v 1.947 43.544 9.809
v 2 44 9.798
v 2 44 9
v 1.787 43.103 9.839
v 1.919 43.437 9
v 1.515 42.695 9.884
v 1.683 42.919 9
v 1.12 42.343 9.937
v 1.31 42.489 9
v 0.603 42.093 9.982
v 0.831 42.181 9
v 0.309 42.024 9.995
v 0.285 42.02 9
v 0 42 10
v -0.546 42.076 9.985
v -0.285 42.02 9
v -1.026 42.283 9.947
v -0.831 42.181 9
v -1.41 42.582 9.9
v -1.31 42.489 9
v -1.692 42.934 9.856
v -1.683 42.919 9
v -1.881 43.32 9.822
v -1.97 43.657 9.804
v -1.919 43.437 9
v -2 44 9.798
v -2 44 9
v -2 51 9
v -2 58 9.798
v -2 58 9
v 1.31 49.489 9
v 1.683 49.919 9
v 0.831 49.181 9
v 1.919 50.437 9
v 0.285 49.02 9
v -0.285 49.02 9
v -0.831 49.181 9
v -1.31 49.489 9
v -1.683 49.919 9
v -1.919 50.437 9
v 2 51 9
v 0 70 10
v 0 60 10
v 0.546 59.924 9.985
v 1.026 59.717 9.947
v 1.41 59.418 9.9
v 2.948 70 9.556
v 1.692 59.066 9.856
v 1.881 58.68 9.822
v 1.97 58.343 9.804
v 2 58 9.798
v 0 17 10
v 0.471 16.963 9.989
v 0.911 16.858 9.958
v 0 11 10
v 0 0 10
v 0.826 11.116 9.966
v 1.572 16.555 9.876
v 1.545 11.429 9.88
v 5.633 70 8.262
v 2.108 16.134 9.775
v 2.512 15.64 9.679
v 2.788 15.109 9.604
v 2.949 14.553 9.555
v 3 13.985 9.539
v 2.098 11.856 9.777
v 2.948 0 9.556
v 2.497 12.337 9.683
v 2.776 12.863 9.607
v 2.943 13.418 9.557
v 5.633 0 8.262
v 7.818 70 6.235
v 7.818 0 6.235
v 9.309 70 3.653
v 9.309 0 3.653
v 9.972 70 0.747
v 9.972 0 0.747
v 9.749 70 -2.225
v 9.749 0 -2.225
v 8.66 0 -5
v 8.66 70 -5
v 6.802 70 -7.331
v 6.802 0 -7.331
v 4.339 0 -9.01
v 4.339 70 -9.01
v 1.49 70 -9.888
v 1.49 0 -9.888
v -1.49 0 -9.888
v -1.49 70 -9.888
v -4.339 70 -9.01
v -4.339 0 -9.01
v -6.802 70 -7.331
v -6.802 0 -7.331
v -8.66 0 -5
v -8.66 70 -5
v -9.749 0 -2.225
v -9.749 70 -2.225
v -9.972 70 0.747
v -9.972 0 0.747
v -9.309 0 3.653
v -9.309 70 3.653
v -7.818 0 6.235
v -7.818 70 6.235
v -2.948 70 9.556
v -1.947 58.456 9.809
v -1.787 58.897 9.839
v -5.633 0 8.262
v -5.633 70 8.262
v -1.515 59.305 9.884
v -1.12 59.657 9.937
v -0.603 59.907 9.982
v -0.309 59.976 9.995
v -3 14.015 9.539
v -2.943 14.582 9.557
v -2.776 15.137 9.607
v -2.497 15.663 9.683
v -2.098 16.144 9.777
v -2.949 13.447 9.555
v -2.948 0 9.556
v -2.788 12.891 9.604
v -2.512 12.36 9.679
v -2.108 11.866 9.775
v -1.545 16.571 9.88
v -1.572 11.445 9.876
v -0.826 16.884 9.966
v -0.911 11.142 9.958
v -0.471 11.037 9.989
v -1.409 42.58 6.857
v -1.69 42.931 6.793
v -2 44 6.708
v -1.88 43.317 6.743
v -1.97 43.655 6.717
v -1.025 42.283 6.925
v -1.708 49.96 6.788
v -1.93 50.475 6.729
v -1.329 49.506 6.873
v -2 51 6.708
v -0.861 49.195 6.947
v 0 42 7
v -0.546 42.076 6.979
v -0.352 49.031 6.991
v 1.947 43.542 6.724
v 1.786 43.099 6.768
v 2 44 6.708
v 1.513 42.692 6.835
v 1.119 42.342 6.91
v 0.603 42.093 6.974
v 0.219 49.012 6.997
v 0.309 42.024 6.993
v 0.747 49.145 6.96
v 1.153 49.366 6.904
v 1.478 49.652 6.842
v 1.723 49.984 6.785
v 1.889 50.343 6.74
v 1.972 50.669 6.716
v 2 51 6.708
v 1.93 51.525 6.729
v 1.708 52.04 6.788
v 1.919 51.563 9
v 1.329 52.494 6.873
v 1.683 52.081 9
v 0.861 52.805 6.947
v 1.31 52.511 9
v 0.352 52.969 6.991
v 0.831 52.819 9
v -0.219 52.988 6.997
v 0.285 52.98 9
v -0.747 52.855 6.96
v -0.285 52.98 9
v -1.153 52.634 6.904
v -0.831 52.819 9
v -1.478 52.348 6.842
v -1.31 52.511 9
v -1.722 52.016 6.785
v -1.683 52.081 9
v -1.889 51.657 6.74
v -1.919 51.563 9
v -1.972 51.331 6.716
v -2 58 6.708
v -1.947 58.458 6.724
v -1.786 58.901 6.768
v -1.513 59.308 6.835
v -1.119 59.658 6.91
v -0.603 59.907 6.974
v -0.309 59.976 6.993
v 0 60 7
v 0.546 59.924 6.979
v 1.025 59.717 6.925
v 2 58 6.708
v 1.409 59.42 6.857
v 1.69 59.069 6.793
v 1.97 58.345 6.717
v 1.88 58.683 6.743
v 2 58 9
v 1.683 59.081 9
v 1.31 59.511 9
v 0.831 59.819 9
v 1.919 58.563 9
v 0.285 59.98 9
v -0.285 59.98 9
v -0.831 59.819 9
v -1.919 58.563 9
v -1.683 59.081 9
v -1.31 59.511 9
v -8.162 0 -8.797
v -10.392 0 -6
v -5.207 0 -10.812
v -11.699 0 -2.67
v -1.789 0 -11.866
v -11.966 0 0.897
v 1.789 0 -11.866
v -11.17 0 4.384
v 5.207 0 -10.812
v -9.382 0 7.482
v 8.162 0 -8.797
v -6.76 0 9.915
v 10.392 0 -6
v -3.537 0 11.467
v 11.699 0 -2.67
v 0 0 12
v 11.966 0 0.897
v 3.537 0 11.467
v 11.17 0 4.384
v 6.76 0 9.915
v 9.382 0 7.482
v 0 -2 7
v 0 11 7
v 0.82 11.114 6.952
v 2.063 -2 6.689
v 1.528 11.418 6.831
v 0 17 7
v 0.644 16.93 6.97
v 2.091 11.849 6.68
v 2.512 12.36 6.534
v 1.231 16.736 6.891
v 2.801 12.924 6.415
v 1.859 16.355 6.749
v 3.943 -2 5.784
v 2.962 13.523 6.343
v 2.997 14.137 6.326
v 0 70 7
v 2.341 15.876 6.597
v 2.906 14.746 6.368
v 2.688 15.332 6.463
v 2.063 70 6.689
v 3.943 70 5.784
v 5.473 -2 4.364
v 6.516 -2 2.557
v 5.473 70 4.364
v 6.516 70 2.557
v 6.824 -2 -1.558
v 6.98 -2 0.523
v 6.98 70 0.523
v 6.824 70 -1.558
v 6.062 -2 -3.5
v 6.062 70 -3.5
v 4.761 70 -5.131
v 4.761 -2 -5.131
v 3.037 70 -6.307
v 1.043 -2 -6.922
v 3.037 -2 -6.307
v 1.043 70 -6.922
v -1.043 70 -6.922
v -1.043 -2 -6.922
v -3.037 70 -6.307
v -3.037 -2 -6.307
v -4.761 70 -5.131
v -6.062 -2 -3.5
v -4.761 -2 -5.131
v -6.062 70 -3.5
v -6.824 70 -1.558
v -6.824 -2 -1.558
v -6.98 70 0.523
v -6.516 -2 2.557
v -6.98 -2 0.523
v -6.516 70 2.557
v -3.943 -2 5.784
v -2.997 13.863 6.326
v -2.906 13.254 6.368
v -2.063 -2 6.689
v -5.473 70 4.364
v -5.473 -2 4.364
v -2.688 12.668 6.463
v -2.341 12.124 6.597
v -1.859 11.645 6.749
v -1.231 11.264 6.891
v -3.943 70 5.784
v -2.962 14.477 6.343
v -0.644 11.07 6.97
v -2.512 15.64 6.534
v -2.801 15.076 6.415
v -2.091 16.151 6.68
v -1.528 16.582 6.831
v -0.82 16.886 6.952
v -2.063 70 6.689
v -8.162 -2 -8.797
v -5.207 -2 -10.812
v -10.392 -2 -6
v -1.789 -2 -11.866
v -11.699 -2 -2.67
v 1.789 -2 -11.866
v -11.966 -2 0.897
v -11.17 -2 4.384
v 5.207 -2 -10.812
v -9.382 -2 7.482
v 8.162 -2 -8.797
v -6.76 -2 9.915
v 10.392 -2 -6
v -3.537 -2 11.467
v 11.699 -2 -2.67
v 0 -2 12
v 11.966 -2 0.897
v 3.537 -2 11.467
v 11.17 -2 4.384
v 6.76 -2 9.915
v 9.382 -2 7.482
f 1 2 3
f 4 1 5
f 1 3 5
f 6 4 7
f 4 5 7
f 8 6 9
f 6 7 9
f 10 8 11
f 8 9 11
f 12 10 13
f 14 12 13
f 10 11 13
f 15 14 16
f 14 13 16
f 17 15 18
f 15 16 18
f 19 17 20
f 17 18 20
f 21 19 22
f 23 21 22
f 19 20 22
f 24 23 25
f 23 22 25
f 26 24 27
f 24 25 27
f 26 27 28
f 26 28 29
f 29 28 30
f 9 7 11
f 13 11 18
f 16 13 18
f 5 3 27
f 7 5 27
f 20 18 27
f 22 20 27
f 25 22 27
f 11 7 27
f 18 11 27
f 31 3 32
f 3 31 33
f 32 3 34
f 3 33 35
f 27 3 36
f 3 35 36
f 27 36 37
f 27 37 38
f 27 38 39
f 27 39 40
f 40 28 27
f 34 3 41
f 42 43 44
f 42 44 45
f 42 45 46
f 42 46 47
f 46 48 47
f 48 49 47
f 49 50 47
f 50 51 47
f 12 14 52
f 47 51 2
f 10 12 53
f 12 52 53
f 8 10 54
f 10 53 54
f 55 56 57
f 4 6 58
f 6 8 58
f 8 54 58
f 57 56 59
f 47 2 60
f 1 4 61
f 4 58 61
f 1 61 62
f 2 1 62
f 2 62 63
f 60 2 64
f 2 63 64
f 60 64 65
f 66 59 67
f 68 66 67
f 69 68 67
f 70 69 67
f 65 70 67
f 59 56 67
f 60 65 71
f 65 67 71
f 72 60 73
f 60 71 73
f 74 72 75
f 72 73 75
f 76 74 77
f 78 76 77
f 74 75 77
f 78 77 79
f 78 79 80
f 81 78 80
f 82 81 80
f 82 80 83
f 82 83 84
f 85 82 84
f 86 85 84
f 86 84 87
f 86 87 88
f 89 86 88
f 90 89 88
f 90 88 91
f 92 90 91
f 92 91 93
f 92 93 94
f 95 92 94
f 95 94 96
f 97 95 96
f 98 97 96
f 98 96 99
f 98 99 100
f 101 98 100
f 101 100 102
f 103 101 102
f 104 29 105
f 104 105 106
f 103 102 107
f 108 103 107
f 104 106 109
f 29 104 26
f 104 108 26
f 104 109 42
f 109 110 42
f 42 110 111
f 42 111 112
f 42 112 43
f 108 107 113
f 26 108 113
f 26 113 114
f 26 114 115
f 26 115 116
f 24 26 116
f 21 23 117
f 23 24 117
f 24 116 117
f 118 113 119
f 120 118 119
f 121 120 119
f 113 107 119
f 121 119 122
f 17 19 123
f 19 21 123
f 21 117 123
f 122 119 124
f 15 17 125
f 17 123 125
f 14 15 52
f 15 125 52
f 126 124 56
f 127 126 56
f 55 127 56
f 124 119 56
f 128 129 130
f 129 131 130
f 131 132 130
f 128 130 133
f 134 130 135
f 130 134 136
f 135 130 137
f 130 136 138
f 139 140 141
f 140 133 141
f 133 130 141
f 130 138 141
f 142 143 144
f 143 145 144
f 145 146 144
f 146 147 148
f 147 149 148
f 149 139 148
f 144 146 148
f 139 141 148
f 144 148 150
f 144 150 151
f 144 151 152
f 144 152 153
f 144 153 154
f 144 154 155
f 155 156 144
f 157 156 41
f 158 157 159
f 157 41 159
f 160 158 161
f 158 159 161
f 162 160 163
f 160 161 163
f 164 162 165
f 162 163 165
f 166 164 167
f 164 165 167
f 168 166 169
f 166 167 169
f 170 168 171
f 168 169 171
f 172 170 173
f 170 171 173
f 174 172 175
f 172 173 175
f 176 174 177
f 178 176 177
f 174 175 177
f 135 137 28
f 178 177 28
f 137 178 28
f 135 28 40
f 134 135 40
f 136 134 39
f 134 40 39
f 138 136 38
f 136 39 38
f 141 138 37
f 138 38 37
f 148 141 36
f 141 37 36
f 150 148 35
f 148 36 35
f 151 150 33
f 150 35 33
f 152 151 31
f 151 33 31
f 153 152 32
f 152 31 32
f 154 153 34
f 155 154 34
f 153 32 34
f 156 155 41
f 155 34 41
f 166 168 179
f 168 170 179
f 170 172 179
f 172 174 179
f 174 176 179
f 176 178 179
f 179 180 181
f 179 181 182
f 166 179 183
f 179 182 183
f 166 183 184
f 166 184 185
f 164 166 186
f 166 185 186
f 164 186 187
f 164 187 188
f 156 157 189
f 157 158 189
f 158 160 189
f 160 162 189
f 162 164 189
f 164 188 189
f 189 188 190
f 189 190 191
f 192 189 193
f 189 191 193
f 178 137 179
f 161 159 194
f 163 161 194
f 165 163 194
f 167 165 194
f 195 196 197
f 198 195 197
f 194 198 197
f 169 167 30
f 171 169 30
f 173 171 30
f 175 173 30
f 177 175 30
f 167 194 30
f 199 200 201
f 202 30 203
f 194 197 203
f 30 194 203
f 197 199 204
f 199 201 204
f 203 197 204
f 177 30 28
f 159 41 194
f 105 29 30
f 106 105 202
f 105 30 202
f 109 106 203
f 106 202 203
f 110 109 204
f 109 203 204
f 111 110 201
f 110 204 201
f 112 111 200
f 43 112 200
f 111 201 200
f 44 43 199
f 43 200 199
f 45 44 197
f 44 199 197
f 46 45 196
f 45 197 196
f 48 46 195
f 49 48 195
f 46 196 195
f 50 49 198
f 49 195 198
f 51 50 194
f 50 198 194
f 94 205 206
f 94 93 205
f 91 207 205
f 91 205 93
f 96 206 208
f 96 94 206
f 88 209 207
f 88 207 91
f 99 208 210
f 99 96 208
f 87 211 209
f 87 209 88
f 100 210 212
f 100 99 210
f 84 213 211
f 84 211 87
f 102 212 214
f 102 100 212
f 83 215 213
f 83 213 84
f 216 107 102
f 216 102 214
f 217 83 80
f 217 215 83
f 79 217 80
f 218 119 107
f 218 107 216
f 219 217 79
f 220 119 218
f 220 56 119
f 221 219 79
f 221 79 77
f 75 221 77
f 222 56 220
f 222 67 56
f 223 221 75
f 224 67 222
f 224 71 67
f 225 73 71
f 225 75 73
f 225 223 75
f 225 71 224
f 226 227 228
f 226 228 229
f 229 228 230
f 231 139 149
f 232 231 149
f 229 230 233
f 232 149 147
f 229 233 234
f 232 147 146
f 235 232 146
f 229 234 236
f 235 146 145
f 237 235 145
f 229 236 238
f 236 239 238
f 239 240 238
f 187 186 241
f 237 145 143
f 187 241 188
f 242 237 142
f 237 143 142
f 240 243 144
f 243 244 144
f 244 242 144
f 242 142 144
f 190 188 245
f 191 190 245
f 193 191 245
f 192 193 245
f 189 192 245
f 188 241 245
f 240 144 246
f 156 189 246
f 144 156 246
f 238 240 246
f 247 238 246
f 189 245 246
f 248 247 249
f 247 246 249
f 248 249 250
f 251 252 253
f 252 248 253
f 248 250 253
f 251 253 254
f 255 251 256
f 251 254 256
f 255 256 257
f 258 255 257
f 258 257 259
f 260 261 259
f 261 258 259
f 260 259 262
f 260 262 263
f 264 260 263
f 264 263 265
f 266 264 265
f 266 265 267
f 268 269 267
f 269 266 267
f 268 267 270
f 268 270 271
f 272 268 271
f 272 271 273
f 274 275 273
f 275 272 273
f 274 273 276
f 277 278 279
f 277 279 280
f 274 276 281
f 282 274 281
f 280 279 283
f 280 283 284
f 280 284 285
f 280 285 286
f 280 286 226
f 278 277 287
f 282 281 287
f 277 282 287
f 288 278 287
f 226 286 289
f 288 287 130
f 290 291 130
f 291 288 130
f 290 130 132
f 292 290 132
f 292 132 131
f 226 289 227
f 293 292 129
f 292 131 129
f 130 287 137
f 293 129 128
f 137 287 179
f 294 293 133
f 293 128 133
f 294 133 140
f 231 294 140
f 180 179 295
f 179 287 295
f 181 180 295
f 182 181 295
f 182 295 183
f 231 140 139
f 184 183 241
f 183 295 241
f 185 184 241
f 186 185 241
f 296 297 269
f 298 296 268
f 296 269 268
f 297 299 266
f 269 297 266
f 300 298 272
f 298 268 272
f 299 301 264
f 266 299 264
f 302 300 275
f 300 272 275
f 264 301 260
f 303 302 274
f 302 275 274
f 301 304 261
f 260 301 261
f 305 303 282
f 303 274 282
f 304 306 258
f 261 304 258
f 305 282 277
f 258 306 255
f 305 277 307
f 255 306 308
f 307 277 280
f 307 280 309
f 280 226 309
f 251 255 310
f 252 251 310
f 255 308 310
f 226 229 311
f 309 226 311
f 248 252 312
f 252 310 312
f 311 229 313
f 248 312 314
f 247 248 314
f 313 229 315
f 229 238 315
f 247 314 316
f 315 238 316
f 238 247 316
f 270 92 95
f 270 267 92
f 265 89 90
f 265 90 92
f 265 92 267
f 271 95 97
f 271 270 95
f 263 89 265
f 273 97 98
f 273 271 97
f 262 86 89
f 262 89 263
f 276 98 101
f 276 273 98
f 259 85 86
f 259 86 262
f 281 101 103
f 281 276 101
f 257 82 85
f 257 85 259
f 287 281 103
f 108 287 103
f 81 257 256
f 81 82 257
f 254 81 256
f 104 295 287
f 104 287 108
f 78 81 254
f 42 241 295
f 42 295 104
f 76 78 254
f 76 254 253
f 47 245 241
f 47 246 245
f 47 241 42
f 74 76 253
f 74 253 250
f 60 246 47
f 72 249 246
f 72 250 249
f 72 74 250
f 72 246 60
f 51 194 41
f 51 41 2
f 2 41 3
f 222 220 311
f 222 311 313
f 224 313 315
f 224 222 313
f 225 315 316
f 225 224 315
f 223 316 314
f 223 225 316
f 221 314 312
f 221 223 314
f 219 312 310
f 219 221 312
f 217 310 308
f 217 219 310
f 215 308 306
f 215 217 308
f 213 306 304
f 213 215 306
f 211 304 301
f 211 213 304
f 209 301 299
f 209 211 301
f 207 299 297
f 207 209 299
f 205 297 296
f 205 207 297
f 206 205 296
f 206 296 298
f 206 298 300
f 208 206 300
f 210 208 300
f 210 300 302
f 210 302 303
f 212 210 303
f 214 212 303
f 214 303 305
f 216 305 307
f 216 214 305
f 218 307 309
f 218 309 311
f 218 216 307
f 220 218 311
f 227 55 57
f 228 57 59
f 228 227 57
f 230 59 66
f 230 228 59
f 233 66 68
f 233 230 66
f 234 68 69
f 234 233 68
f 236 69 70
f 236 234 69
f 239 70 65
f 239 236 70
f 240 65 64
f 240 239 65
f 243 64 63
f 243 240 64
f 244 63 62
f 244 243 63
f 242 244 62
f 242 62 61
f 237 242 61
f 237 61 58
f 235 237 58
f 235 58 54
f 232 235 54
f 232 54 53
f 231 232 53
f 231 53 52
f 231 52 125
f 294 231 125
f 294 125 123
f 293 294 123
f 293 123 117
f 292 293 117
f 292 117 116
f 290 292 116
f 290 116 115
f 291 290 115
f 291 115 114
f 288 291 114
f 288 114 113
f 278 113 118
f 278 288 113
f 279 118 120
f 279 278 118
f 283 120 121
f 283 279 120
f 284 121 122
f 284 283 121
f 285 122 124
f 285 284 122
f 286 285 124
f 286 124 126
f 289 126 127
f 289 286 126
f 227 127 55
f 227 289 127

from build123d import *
from build123d.topology import SkipClean

# Parameters (mm, degrees)
SKETCH2_R                = 12
SKETCH2_R_2              = 10
BOSS_EXTRUDE1_DEPTH      = 2
BOSS_EXTRUDE2_DEPTH      = 70
BOSS_EXTRUDE2_DEPTH_BACK = 2
SKETCH2_2_R              = 10
SKETCH3_R                = 7
CUT_EXTRUDE1_DEPTH       = 74.972968036
SKETCH4_R                = 3
CUT_EXTRUDE2_DEPTH       = 73.027772421
SKETCH4_4_R              = 2
CUT_EXTRUDE3_DEPTH       = 73.027772519
CUT_EXTRUDE4_DEPTH       = 73.027772519
BOSS_EXTRUDE3_DEPTH      = 9
CUT_EXTRUDE5_DEPTH       = 74.972968133
SKETCH6_R                = 2
CUT_EXTRUDE6_DEPTH       = 9


with BuildPart() as part:
    # Sketch2 → Boss-Extrude1 (new body)
    with BuildSketch(Plane(origin=(0, 0, 0), x_dir=(1, 0, 0), z_dir=(0, 1, 0))):
        with Locations(Location((0, 0, 0), (0, 0, 270))):
            Circle(SKETCH2_R)
        with Locations(Location((0, 0, 0), (0, 0, 270))):
            Circle(SKETCH2_R_2, mode=Mode.SUBTRACT)
    extrude(amount=-BOSS_EXTRUDE1_DEPTH)

    # Sketch2<2> → Boss-Extrude2 (add, two sides: drawn at the far end of the back side and taken through both)
    with BuildSketch(Plane(origin=(0, 0, 0), x_dir=(1, 0, 0), z_dir=(0, 1, 0)).offset(-BOSS_EXTRUDE2_DEPTH_BACK)):
        with Locations(Location((0, 0, 0), (0, 0, 270))):
            Circle(SKETCH2_2_R)
    extrude(amount=BOSS_EXTRUDE2_DEPTH + BOSS_EXTRUDE2_DEPTH_BACK)

    # Sketch3 → Cut-Extrude1 (cut, through all)
    with BuildSketch(Plane(origin=(0, 70, 0), x_dir=(1, 0, 0), z_dir=(0, 1, 0))):
        with Locations(Location((0, 0, 0), (0, 0, 270))):
            Circle(SKETCH3_R)
    extrude(amount=-CUT_EXTRUDE1_DEPTH, mode=Mode.SUBTRACT)

    # Sketch4 → Cut-Extrude2 (cut, through all)
    with BuildSketch(Plane.XY):
        with Locations(Location((0, 14, 0), (0, 0, 270))):
            Circle(SKETCH4_R)
    extrude(amount=CUT_EXTRUDE2_DEPTH, mode=Mode.SUBTRACT)

    # Sketch4<4> → Cut-Extrude3 (cut, through all)
    with BuildSketch(Plane.XY):
        with Locations(Location((0, 51, 0), (0, 0, 90))):
            Circle(SKETCH4_4_R)
    extrude(amount=CUT_EXTRUDE3_DEPTH, mode=Mode.SUBTRACT)

    # Sketch4<6> → Cut-Extrude4 (cut, through all)
    with BuildSketch(Plane.XY):
        with BuildLine():
            Line((-2, 44), (-2, 58))
            ThreePointArc((-2, 58), (0, 60), (2, 58))
            Line((2, 58), (2, 44))
            ThreePointArc((2, 44), (0, 42), (-2, 44))
        make_face()
    extrude(amount=CUT_EXTRUDE4_DEPTH, mode=Mode.SUBTRACT)

    # Sketch4<7> → Boss-Extrude3 (add)
    with BuildSketch(Plane.XY):
        with BuildLine():
            Line((-2, 44), (-2, 58))
            ThreePointArc((-2, 58), (0, 60), (2, 58))
            Line((2, 58), (2, 44))
            ThreePointArc((2, 44), (0, 42), (-2, 44))
        make_face()
    extrude(amount=BOSS_EXTRUDE3_DEPTH)

    # Sketch5 → Cut-Extrude5 (cut, through all)
    with BuildSketch(Plane(origin=(0, 70, 0), x_dir=(1, 0, 0), z_dir=(0, 1, 0))):
        with BuildLine():
            Line((3.011686508, -6.318998685), (3.944683927, 2.018210381))
            Line((3.944683927, 2.018210381), (-3.137399774, 2.238378786))
            Line((-3.137399774, 2.238378786), (-2.673709916, -6.469256161))
            ThreePointArc((-2.673709916, -6.469256161), (0.184936128, -6.997556618), (3.011686508, -6.318998685))
        make_face()
    extrude(amount=-CUT_EXTRUDE5_DEPTH, mode=Mode.SUBTRACT)

    # Sketch6 → Cut-Extrude6 (cut)
    with SkipClean():  # the faces are left unmerged after this step: merging them gives an invalid solid
        with BuildSketch(Plane.XY.offset(9)):
            with Locations((0, 51)):
                Circle(SKETCH6_R)
        extrude(amount=-CUT_EXTRUDE6_DEPTH, mode=Mode.SUBTRACT)


solid = part.part
